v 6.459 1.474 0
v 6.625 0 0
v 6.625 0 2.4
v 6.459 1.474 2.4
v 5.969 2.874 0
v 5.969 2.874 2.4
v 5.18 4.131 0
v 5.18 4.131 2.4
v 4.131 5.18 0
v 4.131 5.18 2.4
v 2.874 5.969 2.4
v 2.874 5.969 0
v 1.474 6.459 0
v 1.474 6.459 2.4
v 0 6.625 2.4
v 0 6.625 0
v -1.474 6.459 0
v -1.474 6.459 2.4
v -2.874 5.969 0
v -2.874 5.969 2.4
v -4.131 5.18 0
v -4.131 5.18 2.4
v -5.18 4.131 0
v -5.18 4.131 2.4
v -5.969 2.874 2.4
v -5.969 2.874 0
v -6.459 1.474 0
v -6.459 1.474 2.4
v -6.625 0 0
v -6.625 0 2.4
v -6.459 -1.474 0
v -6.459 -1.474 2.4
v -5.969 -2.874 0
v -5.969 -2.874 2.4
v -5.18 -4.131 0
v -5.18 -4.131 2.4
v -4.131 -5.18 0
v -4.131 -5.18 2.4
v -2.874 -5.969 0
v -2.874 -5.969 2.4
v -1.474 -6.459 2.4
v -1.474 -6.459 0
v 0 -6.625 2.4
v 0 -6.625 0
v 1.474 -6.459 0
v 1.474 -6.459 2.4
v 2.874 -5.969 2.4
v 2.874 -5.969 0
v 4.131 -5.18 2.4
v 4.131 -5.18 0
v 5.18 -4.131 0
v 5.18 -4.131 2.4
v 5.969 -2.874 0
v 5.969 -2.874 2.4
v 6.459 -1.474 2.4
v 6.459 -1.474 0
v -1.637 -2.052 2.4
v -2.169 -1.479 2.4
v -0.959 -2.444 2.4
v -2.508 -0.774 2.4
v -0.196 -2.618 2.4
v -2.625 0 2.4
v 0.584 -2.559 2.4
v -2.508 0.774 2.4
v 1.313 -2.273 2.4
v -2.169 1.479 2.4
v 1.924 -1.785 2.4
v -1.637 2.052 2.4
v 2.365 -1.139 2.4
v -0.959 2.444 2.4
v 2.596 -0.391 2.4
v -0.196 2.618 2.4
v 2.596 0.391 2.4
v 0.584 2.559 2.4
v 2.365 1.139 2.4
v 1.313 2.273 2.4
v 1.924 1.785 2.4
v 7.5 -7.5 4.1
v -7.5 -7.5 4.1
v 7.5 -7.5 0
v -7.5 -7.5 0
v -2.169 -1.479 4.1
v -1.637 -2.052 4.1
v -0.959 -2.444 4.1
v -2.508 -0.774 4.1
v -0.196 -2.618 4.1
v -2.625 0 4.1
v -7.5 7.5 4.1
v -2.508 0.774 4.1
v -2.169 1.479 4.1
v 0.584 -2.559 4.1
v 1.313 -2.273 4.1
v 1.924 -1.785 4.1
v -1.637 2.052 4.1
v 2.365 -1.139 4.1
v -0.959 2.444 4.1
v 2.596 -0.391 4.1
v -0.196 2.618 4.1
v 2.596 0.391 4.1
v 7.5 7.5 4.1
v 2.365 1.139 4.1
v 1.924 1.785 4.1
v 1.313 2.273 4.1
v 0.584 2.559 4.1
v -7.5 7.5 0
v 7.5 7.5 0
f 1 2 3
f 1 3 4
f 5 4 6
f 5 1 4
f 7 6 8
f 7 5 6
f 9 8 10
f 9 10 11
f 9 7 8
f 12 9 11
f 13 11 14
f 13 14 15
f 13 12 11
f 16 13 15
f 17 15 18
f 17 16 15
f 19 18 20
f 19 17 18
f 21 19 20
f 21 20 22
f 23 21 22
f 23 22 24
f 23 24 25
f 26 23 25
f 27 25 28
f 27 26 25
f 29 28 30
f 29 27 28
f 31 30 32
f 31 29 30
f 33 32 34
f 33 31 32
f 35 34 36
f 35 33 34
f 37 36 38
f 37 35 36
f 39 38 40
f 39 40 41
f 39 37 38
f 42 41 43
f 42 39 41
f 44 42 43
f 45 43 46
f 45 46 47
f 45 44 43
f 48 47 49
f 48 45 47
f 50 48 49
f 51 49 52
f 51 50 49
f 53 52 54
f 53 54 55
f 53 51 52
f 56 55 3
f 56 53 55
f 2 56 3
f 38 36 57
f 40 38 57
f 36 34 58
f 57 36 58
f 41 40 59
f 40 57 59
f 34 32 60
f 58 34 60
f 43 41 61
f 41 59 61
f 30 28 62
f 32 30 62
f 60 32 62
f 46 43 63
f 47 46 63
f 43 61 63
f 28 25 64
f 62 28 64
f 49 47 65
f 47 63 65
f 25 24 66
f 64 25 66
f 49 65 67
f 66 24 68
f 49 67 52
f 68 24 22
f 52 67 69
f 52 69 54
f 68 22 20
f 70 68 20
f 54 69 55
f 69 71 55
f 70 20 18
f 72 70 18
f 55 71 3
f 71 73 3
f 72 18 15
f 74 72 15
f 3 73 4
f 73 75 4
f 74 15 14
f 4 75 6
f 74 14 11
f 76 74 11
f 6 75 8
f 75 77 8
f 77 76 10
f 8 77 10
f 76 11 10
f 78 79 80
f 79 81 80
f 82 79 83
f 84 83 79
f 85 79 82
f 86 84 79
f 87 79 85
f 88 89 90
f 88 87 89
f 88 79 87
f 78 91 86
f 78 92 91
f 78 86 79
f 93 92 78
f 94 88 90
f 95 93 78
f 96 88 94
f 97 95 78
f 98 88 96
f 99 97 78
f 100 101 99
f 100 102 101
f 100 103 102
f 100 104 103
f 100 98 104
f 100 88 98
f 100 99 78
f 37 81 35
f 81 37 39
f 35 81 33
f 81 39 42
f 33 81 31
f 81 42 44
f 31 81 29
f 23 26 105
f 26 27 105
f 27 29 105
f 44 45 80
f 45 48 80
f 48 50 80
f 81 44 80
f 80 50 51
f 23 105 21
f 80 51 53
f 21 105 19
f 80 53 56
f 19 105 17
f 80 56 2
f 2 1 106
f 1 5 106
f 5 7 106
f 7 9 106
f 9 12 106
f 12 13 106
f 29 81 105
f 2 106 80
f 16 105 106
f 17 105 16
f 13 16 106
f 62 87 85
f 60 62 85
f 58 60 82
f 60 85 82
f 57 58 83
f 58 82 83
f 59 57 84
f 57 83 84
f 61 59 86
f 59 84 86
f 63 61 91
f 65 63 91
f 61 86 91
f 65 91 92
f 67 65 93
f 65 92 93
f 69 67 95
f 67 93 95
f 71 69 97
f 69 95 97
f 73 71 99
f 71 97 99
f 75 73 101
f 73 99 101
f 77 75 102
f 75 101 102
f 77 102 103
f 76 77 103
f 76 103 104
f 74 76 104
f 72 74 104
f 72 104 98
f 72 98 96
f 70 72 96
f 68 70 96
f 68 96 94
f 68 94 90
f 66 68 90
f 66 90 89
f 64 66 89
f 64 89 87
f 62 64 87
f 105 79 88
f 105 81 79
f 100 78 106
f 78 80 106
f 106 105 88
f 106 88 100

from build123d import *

# Parameters (mm, degrees)
F0_W     = 15
F0_H     = 15
F0_R     = 6.625
F1_DEPTH = 2.4
F2_W     = 15
F2_H     = 15
F3_DEPTH = 1.7
F4_D     = 5.25


with BuildPart() as f1:
    # F0 (on Top) → F1 (new body)
    with BuildSketch(Plane.XY):
        Rectangle(F0_W, F0_H)
        Circle(F0_R, mode=Mode.SUBTRACT)
    extrude(amount=F1_DEPTH)

    # F2 (on face) → F3 (join)
    with BuildSketch(Plane.XY.offset(2.4)):
        Rectangle(F2_W, F2_H)
    extrude(amount=F3_DEPTH)

    # F4 (through all)
    with Locations(Plane(origin=(0, 0, 0), x_dir=(1, 0, 0), z_dir=(0, 0, -1))):
        with Locations((0, 0)):
            Hole(F4_D / 2)


solid = f1.part
